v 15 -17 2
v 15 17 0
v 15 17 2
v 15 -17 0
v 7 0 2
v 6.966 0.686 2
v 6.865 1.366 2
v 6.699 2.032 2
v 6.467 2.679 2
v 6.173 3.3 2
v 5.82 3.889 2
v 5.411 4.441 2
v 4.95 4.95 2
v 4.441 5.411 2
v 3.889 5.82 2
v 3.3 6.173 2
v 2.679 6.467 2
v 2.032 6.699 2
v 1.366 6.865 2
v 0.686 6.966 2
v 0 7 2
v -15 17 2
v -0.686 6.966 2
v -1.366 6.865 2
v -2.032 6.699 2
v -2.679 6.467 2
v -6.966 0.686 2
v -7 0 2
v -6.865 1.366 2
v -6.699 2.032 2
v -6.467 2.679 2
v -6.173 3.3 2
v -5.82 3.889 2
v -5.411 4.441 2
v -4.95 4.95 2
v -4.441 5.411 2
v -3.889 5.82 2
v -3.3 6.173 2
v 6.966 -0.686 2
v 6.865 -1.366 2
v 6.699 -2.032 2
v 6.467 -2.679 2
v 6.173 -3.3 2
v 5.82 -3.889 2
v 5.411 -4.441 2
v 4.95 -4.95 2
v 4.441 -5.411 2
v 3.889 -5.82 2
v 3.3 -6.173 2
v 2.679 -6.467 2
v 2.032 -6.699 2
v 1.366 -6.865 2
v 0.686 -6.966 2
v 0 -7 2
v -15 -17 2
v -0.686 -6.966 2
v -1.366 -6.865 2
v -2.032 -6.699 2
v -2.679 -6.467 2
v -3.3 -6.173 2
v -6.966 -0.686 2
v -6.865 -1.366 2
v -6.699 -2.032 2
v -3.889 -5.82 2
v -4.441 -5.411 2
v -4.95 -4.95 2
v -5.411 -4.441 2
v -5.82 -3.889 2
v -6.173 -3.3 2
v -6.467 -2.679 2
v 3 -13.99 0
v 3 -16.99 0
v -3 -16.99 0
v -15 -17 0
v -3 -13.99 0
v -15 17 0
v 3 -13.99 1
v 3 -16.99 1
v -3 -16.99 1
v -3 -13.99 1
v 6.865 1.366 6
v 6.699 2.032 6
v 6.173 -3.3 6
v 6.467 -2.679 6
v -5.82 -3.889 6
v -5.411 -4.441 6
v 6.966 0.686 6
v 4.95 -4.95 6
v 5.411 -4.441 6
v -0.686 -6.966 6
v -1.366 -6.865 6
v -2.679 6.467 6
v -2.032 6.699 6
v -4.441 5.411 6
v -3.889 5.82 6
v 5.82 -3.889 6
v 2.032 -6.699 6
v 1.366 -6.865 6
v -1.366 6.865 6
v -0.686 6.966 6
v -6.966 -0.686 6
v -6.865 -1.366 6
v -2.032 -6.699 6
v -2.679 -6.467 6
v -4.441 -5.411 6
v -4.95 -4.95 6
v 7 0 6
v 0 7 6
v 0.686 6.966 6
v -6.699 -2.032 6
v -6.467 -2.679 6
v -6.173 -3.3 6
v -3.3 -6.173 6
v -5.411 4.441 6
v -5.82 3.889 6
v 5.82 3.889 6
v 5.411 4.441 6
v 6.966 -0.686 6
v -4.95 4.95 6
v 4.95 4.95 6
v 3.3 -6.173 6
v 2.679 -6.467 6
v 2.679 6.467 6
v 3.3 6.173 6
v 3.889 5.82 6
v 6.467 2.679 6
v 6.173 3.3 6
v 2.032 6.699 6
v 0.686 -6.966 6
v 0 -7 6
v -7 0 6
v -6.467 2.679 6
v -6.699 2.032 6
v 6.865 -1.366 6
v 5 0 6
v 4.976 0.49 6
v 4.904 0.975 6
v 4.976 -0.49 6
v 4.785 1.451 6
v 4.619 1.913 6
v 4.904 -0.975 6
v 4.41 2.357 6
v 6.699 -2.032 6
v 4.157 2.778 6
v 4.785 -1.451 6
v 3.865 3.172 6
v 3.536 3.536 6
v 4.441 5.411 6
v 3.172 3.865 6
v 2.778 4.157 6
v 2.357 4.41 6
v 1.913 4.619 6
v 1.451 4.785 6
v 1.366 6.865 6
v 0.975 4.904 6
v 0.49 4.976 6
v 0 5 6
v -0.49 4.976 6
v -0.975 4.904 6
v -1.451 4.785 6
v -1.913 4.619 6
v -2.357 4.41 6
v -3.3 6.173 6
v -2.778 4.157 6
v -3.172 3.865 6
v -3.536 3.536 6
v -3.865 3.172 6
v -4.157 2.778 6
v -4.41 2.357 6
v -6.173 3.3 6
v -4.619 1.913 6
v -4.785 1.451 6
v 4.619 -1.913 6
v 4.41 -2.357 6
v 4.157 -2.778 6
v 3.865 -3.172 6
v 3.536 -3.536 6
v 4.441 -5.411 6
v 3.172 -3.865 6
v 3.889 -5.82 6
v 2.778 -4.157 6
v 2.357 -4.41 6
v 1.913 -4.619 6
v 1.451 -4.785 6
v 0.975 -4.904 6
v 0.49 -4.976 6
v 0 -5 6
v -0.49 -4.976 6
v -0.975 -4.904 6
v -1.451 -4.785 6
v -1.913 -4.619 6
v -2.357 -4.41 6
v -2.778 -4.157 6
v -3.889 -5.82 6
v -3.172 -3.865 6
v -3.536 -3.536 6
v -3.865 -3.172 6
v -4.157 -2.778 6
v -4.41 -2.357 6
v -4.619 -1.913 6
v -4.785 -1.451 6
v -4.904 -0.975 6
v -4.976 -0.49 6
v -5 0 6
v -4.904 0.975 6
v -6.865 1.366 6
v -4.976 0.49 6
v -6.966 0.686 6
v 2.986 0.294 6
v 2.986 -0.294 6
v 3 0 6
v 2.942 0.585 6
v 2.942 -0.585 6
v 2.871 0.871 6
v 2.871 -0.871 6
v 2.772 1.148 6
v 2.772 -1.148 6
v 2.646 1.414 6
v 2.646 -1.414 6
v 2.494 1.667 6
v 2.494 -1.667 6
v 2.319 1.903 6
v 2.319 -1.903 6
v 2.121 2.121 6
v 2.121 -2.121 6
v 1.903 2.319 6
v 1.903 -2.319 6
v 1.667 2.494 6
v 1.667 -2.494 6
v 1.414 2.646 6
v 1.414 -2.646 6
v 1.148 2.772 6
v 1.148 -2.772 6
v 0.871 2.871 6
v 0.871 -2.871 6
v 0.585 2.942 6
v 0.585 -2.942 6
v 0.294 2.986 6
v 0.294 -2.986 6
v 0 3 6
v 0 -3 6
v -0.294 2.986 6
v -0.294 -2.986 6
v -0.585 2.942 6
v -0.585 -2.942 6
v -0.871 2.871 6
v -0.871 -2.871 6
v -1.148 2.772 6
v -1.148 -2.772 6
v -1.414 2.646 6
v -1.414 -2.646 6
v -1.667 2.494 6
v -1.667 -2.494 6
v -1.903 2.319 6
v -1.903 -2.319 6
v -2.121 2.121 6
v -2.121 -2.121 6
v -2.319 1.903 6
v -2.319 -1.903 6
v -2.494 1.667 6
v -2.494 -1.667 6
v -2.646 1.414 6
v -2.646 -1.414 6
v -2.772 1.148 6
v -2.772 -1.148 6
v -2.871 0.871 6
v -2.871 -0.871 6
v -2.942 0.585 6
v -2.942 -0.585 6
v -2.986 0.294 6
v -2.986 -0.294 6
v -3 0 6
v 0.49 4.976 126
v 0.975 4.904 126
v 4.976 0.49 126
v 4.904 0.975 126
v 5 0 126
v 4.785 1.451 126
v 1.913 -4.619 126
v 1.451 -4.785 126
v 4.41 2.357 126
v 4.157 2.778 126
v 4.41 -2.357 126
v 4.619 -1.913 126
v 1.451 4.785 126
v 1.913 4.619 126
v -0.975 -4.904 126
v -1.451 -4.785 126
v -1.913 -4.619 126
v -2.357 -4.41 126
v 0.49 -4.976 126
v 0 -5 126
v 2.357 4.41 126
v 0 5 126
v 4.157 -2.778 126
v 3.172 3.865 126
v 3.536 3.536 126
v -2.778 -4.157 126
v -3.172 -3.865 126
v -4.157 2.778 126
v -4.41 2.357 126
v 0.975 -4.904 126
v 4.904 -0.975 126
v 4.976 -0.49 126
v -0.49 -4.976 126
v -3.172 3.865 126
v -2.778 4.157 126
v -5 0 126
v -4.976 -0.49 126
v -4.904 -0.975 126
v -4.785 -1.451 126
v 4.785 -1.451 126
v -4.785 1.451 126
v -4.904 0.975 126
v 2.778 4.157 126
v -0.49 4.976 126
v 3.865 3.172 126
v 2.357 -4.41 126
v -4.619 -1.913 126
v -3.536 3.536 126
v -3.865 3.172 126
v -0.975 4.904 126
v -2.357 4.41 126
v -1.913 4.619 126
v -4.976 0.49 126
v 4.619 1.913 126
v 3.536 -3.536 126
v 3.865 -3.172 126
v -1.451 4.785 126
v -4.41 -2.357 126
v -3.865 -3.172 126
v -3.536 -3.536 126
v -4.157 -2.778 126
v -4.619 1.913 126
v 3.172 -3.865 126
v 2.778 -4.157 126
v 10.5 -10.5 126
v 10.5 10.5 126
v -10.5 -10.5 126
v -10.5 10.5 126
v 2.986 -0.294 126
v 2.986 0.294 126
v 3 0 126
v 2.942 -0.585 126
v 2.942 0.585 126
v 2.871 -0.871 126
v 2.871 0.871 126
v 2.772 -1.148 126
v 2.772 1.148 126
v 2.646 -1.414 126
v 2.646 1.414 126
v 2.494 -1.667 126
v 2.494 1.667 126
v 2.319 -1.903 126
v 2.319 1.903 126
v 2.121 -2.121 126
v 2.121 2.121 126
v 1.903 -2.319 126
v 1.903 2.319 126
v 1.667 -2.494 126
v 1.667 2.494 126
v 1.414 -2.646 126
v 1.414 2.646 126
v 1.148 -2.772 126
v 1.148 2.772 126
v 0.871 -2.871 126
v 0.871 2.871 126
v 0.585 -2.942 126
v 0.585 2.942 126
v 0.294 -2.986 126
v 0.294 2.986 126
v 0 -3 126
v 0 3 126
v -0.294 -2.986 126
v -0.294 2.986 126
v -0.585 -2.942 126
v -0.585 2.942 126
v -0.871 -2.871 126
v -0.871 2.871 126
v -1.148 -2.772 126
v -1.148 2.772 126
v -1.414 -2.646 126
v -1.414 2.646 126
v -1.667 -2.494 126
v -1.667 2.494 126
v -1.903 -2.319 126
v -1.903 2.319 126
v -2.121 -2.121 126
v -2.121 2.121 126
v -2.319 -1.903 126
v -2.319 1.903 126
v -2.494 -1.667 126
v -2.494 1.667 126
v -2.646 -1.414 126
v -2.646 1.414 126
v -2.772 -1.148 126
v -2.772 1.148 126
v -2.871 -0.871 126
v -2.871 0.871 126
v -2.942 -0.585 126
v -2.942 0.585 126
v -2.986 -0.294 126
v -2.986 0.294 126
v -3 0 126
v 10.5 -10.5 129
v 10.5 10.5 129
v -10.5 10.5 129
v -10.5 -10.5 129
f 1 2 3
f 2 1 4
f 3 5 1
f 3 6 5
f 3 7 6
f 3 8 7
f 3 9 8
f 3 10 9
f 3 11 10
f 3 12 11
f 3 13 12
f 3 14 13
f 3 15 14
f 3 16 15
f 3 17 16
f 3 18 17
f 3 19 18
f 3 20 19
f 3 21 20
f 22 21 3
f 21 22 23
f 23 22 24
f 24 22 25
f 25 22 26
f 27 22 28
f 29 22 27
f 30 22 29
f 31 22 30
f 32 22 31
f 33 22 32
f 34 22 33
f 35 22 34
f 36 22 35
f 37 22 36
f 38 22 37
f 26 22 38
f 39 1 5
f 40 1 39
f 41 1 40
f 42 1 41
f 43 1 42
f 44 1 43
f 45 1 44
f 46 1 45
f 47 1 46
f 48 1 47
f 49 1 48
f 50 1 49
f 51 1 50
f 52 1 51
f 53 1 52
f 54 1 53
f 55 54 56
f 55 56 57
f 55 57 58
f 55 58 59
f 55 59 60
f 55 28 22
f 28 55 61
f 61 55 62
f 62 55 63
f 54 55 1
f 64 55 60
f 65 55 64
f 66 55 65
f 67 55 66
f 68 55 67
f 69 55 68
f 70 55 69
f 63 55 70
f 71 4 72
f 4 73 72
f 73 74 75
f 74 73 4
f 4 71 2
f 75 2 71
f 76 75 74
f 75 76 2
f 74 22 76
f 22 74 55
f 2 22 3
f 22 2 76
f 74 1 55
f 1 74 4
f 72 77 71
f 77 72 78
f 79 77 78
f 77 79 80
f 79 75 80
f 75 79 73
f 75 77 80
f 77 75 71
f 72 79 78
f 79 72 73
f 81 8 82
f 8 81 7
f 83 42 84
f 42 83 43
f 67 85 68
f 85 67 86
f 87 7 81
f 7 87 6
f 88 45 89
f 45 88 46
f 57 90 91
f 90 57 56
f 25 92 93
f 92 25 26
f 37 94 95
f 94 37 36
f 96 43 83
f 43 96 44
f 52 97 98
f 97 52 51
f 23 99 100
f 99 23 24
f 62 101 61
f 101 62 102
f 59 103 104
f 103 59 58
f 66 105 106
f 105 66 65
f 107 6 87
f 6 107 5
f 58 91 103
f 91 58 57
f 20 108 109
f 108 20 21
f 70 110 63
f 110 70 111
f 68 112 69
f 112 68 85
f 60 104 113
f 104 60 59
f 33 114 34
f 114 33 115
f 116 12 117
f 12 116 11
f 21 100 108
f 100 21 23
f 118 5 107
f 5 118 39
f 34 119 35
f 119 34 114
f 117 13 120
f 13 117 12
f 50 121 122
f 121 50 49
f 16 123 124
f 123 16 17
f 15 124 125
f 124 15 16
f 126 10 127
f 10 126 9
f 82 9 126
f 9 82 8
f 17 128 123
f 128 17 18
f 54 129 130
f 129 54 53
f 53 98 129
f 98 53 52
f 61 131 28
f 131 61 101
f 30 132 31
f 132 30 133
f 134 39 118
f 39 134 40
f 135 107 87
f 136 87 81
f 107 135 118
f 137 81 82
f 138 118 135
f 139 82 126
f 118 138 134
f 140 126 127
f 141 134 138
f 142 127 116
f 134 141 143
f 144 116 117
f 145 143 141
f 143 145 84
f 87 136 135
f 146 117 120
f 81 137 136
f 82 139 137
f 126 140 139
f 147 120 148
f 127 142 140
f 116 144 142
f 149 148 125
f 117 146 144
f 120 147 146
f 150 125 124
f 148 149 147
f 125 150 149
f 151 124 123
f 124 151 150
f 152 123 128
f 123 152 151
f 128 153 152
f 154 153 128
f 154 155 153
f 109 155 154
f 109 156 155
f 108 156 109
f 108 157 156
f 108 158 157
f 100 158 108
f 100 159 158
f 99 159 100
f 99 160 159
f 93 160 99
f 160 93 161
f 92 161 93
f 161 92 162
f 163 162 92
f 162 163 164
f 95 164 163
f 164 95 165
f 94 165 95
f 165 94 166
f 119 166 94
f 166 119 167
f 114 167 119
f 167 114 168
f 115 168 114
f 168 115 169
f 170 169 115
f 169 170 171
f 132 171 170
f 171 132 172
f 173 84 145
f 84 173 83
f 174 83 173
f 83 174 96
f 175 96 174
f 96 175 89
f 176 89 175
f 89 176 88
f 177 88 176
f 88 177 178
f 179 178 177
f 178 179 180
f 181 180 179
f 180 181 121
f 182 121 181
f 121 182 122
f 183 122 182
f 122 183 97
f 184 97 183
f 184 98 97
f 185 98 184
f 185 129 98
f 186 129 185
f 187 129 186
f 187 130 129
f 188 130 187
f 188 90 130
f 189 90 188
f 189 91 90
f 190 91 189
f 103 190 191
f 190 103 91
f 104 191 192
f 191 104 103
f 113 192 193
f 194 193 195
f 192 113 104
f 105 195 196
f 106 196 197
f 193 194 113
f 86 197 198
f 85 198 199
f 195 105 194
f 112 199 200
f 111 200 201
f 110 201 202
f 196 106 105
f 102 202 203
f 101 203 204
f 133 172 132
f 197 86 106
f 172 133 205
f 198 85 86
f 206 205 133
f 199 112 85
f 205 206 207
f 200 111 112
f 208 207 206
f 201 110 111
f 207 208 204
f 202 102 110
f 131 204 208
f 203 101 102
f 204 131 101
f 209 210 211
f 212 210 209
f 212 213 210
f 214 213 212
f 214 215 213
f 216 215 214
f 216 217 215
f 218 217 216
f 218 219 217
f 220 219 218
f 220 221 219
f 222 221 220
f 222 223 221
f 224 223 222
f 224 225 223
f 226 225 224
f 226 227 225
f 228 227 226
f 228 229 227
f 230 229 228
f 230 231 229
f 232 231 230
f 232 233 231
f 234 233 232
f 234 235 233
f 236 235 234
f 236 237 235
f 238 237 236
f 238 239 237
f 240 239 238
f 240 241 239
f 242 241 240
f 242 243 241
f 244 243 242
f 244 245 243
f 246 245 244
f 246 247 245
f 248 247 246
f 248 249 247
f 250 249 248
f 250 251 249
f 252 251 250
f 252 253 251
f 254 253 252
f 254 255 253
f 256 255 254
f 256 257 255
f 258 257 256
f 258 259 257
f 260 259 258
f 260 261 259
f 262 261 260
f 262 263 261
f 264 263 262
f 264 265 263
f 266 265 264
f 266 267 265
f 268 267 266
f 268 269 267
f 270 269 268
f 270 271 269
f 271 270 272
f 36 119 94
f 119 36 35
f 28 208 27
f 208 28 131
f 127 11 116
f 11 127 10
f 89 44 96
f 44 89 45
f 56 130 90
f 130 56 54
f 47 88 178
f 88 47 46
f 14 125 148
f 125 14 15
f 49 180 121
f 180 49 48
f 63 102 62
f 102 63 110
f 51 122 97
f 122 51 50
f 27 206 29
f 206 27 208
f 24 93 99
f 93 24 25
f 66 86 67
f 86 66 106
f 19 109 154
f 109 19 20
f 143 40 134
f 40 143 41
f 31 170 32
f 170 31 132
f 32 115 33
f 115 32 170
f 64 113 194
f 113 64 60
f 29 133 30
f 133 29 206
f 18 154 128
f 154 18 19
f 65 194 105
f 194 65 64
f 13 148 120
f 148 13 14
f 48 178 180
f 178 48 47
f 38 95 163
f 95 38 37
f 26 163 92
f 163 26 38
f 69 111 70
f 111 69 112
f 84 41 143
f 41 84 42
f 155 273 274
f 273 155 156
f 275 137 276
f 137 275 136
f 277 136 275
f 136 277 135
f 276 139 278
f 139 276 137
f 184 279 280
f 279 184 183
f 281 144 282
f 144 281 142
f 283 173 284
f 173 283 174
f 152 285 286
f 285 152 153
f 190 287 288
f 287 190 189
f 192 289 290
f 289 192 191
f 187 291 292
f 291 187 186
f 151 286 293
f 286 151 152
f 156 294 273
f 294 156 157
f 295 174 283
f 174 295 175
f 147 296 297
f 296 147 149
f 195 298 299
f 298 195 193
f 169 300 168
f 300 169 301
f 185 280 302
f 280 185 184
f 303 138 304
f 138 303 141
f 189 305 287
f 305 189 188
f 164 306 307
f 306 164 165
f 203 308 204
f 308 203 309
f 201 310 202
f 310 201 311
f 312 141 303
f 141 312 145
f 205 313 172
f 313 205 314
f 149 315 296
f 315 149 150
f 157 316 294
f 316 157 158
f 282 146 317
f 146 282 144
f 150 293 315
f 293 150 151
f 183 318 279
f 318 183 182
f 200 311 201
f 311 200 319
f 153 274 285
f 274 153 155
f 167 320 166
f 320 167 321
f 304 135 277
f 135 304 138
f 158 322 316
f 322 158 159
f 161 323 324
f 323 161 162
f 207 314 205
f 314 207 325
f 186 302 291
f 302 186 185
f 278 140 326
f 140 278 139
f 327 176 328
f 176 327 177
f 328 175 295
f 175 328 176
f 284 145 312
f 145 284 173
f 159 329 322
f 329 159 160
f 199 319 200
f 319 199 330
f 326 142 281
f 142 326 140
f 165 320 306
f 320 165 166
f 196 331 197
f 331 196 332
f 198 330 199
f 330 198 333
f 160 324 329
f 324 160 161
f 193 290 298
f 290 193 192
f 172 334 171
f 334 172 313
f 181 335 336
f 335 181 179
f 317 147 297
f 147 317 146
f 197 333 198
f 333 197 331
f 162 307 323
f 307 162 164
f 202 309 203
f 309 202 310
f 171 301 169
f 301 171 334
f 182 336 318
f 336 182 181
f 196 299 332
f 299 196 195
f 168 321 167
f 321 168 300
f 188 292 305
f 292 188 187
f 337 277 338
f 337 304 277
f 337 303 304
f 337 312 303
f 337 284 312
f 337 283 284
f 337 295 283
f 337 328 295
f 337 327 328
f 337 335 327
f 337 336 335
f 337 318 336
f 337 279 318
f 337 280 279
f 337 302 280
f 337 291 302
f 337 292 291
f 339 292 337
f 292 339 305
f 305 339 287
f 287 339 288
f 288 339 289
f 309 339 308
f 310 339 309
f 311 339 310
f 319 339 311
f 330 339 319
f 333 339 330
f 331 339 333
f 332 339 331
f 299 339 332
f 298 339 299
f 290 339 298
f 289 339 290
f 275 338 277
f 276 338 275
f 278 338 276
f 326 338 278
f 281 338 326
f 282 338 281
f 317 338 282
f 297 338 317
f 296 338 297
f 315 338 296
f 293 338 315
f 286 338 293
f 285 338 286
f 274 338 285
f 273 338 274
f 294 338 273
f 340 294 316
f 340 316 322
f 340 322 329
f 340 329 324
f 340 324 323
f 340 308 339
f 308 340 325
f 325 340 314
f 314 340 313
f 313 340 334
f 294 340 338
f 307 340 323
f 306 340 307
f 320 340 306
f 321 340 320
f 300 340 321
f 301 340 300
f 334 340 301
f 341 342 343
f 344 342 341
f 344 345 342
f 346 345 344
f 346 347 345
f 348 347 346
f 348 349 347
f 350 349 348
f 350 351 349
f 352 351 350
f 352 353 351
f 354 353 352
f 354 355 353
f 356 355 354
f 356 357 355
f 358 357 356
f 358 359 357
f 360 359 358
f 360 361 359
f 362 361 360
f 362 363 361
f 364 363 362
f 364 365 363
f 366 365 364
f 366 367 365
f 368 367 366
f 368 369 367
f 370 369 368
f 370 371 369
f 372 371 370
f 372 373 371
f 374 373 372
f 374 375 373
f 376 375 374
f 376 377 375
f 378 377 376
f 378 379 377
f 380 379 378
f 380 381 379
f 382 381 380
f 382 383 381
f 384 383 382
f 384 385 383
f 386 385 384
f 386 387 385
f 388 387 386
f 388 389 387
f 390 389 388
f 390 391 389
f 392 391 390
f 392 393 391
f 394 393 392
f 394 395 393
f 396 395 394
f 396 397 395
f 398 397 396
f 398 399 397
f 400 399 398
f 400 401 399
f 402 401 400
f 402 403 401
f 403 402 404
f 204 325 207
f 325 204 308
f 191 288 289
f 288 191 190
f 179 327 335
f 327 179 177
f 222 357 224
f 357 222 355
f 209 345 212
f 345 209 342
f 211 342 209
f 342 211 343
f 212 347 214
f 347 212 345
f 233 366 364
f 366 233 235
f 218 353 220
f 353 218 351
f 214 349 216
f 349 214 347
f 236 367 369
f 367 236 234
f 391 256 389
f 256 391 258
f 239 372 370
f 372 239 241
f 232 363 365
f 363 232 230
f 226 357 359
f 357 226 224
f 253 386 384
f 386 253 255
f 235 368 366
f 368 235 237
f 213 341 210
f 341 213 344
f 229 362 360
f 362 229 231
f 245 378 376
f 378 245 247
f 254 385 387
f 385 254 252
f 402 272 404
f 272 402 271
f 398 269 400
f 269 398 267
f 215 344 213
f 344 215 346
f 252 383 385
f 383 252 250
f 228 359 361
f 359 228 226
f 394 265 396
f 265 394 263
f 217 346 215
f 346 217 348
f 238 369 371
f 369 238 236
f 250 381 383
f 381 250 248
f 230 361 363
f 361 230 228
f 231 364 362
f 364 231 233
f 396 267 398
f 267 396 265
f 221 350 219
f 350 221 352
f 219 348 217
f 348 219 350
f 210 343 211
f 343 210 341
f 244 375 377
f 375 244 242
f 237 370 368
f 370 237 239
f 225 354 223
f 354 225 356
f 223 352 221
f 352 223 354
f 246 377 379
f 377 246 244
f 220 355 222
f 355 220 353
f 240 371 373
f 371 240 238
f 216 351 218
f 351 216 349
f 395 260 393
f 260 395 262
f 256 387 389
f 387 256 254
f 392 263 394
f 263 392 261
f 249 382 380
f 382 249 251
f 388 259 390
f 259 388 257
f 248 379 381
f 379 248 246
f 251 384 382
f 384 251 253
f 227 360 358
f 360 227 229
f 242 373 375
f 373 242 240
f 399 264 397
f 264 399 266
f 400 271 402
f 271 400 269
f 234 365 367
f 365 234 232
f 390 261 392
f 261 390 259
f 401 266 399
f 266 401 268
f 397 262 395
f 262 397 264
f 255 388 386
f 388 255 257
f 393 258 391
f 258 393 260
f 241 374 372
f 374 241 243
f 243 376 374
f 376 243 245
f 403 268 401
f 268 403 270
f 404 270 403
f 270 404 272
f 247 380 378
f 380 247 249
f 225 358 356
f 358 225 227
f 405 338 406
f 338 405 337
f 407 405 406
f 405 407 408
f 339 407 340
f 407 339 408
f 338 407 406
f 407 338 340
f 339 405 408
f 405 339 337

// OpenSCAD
// gps_mast.scad  — sturdy parametric mast with reliable base & top
// Tune these to your hardware
puck_is_round      = false;     // false => square top with hole pattern
puck_diameter      = 26;       // mm (round puck OD)
puck_hole_spacing  = 20;       // mm (square pattern, center-to-center)
puck_hole_d        =  0;       // mm (for M2 screws) — set to 0 for no holes

top_plate_d        = 21;       // mm (round top OD) or for square
top_plate_t        = 3;        // mm thickness

mast_height        = 120;      // mm
mast_od            = 10;       // mm
mast_id            = 6;        // mm (cable channel)
mast_wall_min      = 2;        // mm (keeps OD >= ID + 2*wall)
mast_offset_from_center = 0;   // mm (usually 0)

base_plate_w       = 30;       // mm
base_plate_l       = 34;       // mm
base_plate_t       = 2.0;      // mm
base_csk_hole_d    =   0;      // mm (M3 clearance) set 0 to omit
base_csk_head_d    = 6.2;      // mm (counterbore)
base_csk_head_t    = 2.0;      // mm depth
slot_len           = 0;  //18; // mm elongated mount slots
slot_w             = 0;  //3.4;// mm
slot_pitch         = 30;       // mm (distance between slots centers)

mast_to_base_boss_d = 14;      // mm (boss that ties mast to base)
mast_to_base_boss_t = 4;       // mm

cable_exit_slot_w  = 6;        // mm (in base rear)
cable_exit_slot_h  = 3;        // mm
$fn = 64;

// ---- helpers ----
eps = 0.01;
function clamp(v, lo, hi) = max(lo, min(hi, v));

// Round slot (capsule)
module slot_capsule(len, width, t){
  linear_extrude(height=t)
    hull(){
      translate([ len/2 - width/2, 0, 0]) circle(d=width);
      translate([-len/2 + width/2, 0, 0]) circle(d=width);
    }
}

// ---- parts ----
module base_plate(){
  difference(){
    // base block
    translate([-base_plate_w/2, -base_plate_l/2, 0])
      cube([base_plate_w, base_plate_l, base_plate_t], center=false);

    // elongated slots (x-axis)
    if (slot_w > 0 && slot_len > 0){
      translate([  slot_pitch/2, 0, -eps]) slot_capsule(slot_len, slot_w, base_plate_t+2*eps);
      translate([ -slot_pitch/2, 0, -eps]) slot_capsule(slot_len, slot_w, base_plate_t+2*eps);
    }

    // cable exit at rear edge
    translate([0, -base_plate_l/2 + cable_exit_slot_h/2 + eps, -eps])
      cube([cable_exit_slot_w, cable_exit_slot_h, base_plate_t+2*eps], center=true);

    // counterbored vertical mount holes (optional)
    if (base_csk_hole_d > 0){
      for (x=[ slot_pitch/2, -slot_pitch/2 ]){
        // through hole
        translate([x, 0, -eps]) cylinder(d=base_csk_hole_d, h=base_plate_t+2*eps);
        // counterbore from top
        translate([x, 0, base_plate_t - base_csk_head_t + eps])
          cylinder(d=base_csk_head_d, h=base_csk_head_t+eps);
      }
    }
  }

  // mast boss on top of base
  translate([mast_offset_from_center, 0, base_plate_t])
    cylinder(d=mast_to_base_boss_d, h=mast_to_base_boss_t);
}

module mast_tube(){
  mast_od_eff = max(mast_od, mast_id + 2*mast_wall_min);
  difference(){
    cylinder(d=mast_od_eff, h=mast_height);
    translate([0,0,-eps]) cylinder(d=mast_id, h=mast_height+2*eps);
  }
}

module top_plate(){
  translate([0,0,base_plate_t + mast_to_base_boss_t + mast_height]){
    if (puck_is_round){
      // round top
      difference(){
        cylinder(d=top_plate_d, h=top_plate_t);
        // center pilot (optional)
        // translate([0,0,-eps]) cylinder(d=2.0, h=top_plate_t+2*eps);
      }
    } else {
      // square top
      difference(){
        translate([-top_plate_d/2, -top_plate_d/2, 0])
          cube([top_plate_d, top_plate_d, top_plate_t]);
        // mounting holes
        if (puck_hole_d > 0){
          for (sx=[-1,1]) for (sy=[-1,1]){
            translate([sx*puck_hole_spacing/2, sy*puck_hole_spacing/2, -eps])
              cylinder(d=puck_hole_d, h=top_plate_t+2*eps);
          }
        }
      }
    }
  }
}

// ---- assembly ----
module gps_mast(){
  // base
  base_plate();

  // mast (centered on boss)
  translate([mast_offset_from_center, 0, base_plate_t + mast_to_base_boss_t])
    mast_tube();

  // top
  top_plate();
}

// Preview
gps_mast();
